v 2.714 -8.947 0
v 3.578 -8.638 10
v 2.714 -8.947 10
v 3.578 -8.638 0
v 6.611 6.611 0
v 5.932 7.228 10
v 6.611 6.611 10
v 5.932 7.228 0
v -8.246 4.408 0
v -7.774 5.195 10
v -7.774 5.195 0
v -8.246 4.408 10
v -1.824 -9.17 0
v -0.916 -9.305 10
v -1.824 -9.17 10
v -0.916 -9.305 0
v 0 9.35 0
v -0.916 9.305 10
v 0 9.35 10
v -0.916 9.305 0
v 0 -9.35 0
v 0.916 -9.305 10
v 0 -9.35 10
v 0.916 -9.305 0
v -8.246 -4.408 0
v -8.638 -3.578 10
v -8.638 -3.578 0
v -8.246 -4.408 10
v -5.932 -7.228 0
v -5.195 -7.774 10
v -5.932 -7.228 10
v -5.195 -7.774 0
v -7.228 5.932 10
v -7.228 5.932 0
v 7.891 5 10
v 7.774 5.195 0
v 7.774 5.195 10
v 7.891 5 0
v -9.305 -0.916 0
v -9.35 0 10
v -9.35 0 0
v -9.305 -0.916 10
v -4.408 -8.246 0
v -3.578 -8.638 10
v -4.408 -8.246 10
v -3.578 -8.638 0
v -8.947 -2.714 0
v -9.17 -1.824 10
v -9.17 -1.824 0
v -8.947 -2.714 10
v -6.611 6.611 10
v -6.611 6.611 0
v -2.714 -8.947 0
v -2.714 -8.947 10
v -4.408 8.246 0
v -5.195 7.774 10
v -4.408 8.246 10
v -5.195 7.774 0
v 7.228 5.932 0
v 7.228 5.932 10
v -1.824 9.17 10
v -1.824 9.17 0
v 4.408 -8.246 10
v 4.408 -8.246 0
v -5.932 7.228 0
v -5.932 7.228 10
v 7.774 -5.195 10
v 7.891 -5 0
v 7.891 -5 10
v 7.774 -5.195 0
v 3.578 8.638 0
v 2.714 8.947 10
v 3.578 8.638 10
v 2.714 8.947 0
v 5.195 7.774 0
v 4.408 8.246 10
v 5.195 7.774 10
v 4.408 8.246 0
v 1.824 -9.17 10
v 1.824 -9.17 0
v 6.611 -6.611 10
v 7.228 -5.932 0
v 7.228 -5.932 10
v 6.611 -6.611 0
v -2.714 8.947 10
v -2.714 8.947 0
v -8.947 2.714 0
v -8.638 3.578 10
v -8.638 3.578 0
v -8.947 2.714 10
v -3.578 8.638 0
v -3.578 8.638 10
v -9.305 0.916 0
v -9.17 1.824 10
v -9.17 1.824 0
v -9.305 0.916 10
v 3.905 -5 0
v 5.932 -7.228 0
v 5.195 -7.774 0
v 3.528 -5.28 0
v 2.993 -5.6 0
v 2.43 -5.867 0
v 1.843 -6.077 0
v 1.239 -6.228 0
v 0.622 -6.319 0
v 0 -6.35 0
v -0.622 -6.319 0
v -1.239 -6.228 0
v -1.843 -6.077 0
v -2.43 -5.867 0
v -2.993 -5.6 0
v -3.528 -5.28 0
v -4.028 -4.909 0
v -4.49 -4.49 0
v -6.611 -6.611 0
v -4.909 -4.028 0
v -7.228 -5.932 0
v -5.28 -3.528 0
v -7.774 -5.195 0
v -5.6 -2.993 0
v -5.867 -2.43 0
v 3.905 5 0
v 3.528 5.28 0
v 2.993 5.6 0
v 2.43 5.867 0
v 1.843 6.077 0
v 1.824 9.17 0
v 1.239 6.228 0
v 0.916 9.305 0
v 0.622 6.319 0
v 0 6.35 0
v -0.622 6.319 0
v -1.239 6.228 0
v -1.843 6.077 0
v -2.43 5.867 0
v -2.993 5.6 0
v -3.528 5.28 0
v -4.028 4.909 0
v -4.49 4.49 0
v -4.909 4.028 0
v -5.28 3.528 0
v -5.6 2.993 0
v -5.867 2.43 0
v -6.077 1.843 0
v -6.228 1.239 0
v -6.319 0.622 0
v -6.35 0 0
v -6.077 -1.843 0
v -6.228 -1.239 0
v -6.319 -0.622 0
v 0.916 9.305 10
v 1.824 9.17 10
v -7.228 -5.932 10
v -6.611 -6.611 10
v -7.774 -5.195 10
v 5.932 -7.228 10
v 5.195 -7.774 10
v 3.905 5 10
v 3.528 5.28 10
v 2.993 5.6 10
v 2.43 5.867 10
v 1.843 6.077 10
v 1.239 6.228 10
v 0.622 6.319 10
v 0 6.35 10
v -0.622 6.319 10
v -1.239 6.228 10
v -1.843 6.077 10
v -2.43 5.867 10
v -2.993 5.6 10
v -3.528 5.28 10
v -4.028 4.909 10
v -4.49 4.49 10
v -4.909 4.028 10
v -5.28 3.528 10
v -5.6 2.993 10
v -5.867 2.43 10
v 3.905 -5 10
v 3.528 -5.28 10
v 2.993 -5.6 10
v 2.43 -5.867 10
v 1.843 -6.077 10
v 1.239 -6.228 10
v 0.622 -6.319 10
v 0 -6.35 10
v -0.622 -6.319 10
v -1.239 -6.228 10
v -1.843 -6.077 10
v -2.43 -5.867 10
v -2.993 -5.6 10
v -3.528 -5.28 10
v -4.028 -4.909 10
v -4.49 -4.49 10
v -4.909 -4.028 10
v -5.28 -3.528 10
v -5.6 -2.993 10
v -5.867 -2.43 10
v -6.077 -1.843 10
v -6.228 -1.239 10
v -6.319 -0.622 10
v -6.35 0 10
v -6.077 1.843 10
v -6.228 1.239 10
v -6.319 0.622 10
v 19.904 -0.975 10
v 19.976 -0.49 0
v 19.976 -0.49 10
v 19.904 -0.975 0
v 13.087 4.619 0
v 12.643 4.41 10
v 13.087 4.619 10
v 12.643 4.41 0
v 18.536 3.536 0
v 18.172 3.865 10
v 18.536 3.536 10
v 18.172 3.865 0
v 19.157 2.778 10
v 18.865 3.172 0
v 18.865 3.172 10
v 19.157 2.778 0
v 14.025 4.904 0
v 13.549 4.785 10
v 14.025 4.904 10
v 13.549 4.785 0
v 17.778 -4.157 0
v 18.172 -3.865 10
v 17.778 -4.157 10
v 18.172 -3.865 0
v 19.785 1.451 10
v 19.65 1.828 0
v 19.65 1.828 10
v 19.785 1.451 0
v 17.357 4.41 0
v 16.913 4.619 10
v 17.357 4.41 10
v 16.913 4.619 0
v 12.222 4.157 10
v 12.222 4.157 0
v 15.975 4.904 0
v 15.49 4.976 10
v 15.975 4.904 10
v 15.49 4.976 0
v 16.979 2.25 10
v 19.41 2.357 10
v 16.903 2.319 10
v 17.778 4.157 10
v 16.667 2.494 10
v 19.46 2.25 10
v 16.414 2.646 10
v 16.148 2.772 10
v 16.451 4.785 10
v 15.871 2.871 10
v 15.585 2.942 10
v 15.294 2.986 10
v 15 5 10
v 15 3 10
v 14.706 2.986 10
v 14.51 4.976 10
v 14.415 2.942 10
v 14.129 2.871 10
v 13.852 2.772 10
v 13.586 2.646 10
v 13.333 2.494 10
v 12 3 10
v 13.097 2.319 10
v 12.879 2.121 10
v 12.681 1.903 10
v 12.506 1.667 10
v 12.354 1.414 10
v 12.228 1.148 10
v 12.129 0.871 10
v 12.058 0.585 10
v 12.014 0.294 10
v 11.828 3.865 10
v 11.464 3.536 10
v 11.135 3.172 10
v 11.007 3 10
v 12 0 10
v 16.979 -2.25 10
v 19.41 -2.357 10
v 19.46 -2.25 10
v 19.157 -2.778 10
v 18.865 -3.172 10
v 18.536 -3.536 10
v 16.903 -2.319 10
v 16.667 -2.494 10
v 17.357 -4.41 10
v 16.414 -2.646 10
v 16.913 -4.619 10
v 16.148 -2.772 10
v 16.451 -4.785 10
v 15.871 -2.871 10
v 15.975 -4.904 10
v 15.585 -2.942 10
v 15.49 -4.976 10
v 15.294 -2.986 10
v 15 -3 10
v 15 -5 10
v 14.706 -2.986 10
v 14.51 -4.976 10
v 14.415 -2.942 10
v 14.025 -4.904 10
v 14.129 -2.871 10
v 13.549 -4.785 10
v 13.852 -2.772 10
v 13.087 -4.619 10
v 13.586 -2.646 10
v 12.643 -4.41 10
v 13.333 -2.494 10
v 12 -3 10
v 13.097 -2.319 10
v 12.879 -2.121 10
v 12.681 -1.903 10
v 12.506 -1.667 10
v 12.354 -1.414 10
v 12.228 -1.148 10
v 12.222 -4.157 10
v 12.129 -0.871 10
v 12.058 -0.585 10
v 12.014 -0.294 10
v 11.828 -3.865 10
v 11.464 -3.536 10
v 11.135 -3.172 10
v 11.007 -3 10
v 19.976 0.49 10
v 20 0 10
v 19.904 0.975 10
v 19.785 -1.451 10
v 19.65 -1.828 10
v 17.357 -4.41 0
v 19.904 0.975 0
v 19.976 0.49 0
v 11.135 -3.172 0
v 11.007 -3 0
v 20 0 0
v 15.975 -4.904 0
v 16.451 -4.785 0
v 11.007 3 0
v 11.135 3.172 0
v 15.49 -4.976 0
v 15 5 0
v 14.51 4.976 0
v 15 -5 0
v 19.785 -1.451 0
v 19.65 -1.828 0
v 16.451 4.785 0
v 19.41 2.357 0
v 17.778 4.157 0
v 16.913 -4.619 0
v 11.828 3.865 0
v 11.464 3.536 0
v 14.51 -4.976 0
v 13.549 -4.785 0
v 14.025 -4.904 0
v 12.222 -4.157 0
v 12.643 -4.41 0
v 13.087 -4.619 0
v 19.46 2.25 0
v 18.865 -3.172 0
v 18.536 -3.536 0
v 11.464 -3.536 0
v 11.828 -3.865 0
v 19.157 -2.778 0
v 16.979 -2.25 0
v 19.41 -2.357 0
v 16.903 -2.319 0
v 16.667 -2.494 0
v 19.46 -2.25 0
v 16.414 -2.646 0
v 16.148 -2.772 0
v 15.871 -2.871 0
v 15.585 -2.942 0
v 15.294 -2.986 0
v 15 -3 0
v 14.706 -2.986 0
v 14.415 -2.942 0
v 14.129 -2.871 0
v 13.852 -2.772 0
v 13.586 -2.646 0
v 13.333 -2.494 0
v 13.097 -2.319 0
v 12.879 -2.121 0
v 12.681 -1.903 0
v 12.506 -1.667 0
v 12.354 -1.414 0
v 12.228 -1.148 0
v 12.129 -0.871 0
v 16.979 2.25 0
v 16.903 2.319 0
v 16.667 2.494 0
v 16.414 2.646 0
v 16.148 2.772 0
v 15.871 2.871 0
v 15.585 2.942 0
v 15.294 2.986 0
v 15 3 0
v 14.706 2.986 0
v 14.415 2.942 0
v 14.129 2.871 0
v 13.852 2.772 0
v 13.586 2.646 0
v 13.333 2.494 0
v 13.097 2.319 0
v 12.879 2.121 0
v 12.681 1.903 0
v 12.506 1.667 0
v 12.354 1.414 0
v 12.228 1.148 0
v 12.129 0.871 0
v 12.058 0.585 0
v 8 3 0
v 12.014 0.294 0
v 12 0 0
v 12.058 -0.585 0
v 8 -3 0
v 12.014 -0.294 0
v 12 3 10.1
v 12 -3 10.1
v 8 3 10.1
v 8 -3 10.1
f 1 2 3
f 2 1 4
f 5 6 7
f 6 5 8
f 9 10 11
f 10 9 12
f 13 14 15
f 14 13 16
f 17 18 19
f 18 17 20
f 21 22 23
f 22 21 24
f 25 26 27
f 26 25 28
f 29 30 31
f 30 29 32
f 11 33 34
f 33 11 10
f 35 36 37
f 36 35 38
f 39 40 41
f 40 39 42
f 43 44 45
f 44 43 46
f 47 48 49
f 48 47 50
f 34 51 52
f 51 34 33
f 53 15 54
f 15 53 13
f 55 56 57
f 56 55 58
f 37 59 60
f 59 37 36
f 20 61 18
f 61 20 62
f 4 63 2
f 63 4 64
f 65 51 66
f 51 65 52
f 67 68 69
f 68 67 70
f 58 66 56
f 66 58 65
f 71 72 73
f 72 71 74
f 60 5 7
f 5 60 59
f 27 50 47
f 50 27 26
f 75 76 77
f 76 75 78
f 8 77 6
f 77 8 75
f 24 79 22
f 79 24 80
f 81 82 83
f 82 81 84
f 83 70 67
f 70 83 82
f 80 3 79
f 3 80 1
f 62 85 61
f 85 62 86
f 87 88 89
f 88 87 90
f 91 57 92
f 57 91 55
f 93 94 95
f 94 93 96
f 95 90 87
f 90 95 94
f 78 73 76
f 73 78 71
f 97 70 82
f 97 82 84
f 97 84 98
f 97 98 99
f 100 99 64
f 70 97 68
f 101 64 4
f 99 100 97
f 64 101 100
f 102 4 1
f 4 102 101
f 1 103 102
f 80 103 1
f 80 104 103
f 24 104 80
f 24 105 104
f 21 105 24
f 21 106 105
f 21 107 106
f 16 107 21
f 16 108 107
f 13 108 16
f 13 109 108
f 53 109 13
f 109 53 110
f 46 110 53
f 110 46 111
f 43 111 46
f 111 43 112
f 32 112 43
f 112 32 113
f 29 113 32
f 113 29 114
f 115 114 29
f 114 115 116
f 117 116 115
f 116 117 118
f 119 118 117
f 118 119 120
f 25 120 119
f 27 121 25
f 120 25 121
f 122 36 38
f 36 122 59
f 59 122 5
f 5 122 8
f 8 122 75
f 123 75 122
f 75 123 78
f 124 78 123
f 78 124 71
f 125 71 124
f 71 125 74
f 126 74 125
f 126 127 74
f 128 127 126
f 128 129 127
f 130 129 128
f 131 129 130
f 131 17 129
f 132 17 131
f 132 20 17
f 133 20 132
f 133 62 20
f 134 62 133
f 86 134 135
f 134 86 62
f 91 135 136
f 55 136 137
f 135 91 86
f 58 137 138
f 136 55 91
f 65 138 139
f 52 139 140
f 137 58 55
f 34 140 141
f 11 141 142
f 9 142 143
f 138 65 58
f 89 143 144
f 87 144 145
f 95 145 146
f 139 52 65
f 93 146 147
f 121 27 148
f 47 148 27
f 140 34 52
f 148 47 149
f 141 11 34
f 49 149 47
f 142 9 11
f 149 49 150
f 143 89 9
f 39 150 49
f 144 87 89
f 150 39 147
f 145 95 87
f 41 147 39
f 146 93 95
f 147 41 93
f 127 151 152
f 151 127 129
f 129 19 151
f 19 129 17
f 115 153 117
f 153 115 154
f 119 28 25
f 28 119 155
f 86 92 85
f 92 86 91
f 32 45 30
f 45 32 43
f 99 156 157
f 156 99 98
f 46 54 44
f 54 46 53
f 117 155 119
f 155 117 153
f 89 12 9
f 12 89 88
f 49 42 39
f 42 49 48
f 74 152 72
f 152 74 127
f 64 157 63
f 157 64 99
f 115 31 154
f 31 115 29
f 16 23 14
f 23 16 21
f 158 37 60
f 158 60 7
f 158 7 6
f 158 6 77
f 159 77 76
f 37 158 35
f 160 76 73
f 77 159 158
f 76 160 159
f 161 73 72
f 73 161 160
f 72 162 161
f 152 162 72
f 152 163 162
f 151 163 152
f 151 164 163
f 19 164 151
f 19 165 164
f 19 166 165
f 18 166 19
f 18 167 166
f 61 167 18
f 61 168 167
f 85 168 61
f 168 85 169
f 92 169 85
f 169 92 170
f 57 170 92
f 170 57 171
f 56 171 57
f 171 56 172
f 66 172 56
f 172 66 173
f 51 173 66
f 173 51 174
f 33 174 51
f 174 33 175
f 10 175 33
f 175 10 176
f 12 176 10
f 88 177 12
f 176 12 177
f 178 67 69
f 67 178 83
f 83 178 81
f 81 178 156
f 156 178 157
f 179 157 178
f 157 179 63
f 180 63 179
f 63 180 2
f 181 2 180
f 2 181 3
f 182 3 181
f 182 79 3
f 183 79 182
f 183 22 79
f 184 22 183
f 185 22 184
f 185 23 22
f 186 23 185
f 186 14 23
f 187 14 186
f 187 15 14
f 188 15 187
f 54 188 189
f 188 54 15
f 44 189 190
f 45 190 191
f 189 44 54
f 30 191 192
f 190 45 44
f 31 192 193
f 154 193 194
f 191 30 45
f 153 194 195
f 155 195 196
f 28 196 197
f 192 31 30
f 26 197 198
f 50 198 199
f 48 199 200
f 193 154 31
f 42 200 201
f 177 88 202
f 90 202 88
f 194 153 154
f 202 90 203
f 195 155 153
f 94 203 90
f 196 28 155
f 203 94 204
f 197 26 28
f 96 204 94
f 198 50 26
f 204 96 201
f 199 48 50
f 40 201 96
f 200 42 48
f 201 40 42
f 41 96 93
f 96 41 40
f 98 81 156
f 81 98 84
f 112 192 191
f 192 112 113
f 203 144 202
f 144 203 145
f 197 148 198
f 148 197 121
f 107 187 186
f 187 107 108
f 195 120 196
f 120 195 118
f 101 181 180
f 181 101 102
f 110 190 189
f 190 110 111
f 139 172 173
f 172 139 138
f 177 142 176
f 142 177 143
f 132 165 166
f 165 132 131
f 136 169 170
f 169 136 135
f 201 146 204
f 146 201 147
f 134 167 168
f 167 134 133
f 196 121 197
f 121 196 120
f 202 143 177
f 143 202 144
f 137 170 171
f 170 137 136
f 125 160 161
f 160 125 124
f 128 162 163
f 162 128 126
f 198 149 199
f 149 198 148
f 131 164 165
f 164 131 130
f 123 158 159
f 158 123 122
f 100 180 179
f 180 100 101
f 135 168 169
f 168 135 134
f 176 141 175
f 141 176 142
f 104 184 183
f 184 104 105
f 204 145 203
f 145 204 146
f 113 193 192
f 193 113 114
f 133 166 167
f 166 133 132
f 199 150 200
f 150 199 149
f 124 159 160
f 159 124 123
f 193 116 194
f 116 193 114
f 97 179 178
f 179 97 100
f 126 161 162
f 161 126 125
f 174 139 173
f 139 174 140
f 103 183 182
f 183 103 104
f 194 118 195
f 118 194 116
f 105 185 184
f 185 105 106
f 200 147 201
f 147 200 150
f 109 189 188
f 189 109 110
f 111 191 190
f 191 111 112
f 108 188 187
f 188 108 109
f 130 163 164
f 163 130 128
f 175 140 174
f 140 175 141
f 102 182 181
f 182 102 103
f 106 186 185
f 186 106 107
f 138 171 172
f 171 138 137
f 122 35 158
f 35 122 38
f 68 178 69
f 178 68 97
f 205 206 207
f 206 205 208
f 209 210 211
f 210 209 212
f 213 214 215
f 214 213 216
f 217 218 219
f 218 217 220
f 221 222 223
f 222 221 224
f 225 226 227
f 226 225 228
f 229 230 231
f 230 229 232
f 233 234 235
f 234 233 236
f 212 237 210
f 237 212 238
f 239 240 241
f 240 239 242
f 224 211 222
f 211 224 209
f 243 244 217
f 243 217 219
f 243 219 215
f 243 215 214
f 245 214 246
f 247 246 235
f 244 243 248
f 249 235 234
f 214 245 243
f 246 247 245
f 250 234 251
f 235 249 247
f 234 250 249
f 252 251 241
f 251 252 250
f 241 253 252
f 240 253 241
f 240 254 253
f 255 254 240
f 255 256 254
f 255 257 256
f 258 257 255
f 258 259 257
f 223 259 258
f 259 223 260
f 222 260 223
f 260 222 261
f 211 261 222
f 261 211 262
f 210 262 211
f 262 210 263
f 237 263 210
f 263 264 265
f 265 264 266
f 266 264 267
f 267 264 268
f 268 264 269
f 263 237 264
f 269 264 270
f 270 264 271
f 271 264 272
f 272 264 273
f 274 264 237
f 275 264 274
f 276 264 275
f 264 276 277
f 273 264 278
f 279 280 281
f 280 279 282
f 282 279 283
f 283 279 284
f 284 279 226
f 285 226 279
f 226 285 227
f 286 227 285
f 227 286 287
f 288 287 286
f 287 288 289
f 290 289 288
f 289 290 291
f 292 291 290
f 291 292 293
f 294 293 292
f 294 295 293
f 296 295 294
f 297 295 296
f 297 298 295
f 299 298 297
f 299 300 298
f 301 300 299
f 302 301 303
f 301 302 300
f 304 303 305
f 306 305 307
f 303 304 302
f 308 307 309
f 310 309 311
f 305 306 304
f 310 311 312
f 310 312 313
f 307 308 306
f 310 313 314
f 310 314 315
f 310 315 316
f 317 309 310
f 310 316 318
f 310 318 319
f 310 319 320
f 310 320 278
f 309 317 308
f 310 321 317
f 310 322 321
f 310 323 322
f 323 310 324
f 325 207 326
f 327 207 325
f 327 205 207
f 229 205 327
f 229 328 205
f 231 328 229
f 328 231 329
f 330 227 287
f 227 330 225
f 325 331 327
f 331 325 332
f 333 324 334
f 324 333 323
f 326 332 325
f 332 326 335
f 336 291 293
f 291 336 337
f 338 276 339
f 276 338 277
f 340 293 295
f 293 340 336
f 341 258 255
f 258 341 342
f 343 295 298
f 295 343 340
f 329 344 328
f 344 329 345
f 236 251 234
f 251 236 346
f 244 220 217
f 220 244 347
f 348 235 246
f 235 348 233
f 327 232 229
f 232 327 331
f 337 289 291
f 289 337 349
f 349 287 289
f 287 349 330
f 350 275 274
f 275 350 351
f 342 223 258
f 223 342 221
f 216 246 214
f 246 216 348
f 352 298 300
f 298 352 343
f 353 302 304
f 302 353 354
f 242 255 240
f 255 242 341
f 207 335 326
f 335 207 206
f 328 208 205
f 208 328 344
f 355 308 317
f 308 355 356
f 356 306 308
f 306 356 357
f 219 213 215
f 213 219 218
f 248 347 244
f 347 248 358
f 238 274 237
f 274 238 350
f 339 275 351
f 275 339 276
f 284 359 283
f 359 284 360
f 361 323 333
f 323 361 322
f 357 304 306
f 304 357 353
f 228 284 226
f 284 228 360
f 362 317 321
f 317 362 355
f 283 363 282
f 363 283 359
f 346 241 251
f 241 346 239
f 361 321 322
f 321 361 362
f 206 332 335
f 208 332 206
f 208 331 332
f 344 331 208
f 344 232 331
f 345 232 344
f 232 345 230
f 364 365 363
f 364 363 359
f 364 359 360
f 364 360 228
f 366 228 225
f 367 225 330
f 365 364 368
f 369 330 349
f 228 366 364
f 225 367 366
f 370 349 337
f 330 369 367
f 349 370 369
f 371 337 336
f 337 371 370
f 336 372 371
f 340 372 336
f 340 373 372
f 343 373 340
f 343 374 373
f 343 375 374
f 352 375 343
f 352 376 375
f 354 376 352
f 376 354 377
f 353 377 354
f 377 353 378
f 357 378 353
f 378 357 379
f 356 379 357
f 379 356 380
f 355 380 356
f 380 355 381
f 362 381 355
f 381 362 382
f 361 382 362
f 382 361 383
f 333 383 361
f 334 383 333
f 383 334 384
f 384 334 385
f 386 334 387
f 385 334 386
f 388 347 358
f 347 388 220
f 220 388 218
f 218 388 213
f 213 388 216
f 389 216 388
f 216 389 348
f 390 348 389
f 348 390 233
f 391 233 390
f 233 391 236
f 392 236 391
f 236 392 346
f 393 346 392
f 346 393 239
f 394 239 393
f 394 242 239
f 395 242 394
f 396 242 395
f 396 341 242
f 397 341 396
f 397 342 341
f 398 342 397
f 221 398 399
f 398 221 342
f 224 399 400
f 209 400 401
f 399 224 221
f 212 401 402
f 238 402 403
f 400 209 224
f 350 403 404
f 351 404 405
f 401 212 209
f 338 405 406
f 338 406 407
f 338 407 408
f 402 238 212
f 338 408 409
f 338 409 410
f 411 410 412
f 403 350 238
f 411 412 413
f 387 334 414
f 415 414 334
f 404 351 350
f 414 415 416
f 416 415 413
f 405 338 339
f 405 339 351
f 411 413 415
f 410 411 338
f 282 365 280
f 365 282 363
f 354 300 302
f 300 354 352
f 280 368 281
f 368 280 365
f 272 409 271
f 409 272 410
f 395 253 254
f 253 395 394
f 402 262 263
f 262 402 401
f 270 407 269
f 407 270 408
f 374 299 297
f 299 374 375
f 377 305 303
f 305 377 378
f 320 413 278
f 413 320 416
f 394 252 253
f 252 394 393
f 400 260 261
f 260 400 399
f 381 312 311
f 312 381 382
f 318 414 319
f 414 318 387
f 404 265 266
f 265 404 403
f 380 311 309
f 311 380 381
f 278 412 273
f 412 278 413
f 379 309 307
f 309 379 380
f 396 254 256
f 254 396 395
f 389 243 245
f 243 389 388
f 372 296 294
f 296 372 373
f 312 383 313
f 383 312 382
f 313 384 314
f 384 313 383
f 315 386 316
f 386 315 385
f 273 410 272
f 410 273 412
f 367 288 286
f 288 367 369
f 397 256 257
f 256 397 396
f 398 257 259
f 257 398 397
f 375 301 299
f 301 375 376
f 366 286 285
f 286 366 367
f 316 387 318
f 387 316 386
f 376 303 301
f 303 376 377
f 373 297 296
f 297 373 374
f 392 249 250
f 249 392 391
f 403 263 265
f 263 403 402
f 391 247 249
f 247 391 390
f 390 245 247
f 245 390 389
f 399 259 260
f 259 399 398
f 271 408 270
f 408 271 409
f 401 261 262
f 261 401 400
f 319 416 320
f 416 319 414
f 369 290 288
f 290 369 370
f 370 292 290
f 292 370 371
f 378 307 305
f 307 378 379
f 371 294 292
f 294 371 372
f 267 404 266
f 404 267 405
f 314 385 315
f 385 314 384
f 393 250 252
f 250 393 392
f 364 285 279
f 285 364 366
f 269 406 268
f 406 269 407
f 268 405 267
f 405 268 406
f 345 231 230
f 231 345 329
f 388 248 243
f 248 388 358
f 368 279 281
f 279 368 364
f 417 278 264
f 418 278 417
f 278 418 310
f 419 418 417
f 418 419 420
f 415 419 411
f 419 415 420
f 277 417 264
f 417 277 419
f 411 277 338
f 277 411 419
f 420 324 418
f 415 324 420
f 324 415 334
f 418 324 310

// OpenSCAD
// Snap-on Clip for Lab Stand Rod and Tubing
// Orientation: Flat on XY plane, building up in +Z.
// Units: Millimetres.

// --- Dimensions ---
// Rod Ring
$rod_id = 12.7;      // Inner diameter (mm)
$rod_wall = 3.0;     // Wall thickness (mm)
$rod_od = $rod_id + 2 * $rod_wall; // Outer diameter (mm)
$rod_z = 10.0;       // Height of extrusion (mm)

// Tubing Ring
$tube_id = 6.0;      // Inner diameter (mm)
$tube_wall = 2.0;    // Wall thickness (mm)
$tube_od = $tube_id + 2 * $tube_wall; // Outer diameter (mm)
$tube_x_center = 15.0; // Center X position (mm)

// Bridge
$bridge_x_start = 8.0; // Start X (mm)
$bridge_x_end = 12.0;  // End X (mm)
$bridge_y_half = 3.0;  // Half width in Y (mm) -> Total 6mm

// Cutouts (Openings)
// Rod Ring Cutout: -X side relative to ring center, width 10mm
$rod_cut_width = 10.0;
$rod_cut_y_half = $rod_cut_width / 2;

// Tubing Ring Cutout: +X side relative to ring center, width 4.5mm
$tube_cut_width = 4.5;
$tube_cut_y_half = $tube_cut_width / 2;

// --- Geometry Construction ---

module rod_ring() {
    // Main ring body centered at (0,0)
    difference() {
        // Outer ring
        translate([0, 0, 0])
            cylinder(h = $rod_z, d = $rod_od, $fn = 64);
        
        // Inner hole
        translate([0, 0, 0])
            cylinder(h = $rod_z + 0.1, d = $rod_id, $fn = 64);
        
        // Cutout on -X side relative to ring center
        // Remove area where x < 0 (relative to ring) and -5 < y < 5
        // Extend slightly past faces for clean cut
        translate([-0.05, -$rod_cut_y_half, 0])
            cube([
                $rod_cut_width + 0.1, // Width in X
                $rod_cut_width,       // Width in Y
                $rod_z + 0.1          // Height
            ]);
    }
}

module tube_ring() {
    // Main ring body centered at (tube_x_center, 0)
    difference() {
        // Outer ring
        translate([0, 0, 0])
            cylinder(h = $rod_z, d = $tube_od, $fn = 64);
        
        // Inner hole
        translate([0, 0, 0])
            cylinder(h = $rod_z + 0.1, d = $tube_id, $fn = 64);
        
        // Cutout on +X side relative to ring center
        // Remove area where x > 0 (relative to ring) and -2.25 < y < 2.25
        translate([0.05, -$tube_cut_y_half, 0])
            cube([
                $tube_cut_width + 0.1, // Width in X
                $tube_cut_width,       // Width in Y
                $rod_z + 0.1           // Height
            ]);
    }
}

module bridge() {
    // Solid bridge connecting the two rings
    // Spans from x=8 to x=12, width 6mm in Y
    translate([0, -$bridge_y_half, 0])
        cube([
            $bridge_x_end - $bridge_x_start, // Width in X
            $bridge_y_half * 2,              // Width in Y (6mm)
            $rod_z + 0.1                     // Height
        ]);
}

// --- Final Assembly ---

difference() {
    union() {
        // 1. Rod Ring (Centered at origin)
        translate([0, 0, 0])
            rod_ring();
        
        // 2. Tubing Ring (Centered at x=15)
        translate([$tube_x_center, 0, 0])
            tube_ring();
        
        // 3. Bridge
        translate([$bridge_x_start, 0, 0])
            bridge();
    }
}
